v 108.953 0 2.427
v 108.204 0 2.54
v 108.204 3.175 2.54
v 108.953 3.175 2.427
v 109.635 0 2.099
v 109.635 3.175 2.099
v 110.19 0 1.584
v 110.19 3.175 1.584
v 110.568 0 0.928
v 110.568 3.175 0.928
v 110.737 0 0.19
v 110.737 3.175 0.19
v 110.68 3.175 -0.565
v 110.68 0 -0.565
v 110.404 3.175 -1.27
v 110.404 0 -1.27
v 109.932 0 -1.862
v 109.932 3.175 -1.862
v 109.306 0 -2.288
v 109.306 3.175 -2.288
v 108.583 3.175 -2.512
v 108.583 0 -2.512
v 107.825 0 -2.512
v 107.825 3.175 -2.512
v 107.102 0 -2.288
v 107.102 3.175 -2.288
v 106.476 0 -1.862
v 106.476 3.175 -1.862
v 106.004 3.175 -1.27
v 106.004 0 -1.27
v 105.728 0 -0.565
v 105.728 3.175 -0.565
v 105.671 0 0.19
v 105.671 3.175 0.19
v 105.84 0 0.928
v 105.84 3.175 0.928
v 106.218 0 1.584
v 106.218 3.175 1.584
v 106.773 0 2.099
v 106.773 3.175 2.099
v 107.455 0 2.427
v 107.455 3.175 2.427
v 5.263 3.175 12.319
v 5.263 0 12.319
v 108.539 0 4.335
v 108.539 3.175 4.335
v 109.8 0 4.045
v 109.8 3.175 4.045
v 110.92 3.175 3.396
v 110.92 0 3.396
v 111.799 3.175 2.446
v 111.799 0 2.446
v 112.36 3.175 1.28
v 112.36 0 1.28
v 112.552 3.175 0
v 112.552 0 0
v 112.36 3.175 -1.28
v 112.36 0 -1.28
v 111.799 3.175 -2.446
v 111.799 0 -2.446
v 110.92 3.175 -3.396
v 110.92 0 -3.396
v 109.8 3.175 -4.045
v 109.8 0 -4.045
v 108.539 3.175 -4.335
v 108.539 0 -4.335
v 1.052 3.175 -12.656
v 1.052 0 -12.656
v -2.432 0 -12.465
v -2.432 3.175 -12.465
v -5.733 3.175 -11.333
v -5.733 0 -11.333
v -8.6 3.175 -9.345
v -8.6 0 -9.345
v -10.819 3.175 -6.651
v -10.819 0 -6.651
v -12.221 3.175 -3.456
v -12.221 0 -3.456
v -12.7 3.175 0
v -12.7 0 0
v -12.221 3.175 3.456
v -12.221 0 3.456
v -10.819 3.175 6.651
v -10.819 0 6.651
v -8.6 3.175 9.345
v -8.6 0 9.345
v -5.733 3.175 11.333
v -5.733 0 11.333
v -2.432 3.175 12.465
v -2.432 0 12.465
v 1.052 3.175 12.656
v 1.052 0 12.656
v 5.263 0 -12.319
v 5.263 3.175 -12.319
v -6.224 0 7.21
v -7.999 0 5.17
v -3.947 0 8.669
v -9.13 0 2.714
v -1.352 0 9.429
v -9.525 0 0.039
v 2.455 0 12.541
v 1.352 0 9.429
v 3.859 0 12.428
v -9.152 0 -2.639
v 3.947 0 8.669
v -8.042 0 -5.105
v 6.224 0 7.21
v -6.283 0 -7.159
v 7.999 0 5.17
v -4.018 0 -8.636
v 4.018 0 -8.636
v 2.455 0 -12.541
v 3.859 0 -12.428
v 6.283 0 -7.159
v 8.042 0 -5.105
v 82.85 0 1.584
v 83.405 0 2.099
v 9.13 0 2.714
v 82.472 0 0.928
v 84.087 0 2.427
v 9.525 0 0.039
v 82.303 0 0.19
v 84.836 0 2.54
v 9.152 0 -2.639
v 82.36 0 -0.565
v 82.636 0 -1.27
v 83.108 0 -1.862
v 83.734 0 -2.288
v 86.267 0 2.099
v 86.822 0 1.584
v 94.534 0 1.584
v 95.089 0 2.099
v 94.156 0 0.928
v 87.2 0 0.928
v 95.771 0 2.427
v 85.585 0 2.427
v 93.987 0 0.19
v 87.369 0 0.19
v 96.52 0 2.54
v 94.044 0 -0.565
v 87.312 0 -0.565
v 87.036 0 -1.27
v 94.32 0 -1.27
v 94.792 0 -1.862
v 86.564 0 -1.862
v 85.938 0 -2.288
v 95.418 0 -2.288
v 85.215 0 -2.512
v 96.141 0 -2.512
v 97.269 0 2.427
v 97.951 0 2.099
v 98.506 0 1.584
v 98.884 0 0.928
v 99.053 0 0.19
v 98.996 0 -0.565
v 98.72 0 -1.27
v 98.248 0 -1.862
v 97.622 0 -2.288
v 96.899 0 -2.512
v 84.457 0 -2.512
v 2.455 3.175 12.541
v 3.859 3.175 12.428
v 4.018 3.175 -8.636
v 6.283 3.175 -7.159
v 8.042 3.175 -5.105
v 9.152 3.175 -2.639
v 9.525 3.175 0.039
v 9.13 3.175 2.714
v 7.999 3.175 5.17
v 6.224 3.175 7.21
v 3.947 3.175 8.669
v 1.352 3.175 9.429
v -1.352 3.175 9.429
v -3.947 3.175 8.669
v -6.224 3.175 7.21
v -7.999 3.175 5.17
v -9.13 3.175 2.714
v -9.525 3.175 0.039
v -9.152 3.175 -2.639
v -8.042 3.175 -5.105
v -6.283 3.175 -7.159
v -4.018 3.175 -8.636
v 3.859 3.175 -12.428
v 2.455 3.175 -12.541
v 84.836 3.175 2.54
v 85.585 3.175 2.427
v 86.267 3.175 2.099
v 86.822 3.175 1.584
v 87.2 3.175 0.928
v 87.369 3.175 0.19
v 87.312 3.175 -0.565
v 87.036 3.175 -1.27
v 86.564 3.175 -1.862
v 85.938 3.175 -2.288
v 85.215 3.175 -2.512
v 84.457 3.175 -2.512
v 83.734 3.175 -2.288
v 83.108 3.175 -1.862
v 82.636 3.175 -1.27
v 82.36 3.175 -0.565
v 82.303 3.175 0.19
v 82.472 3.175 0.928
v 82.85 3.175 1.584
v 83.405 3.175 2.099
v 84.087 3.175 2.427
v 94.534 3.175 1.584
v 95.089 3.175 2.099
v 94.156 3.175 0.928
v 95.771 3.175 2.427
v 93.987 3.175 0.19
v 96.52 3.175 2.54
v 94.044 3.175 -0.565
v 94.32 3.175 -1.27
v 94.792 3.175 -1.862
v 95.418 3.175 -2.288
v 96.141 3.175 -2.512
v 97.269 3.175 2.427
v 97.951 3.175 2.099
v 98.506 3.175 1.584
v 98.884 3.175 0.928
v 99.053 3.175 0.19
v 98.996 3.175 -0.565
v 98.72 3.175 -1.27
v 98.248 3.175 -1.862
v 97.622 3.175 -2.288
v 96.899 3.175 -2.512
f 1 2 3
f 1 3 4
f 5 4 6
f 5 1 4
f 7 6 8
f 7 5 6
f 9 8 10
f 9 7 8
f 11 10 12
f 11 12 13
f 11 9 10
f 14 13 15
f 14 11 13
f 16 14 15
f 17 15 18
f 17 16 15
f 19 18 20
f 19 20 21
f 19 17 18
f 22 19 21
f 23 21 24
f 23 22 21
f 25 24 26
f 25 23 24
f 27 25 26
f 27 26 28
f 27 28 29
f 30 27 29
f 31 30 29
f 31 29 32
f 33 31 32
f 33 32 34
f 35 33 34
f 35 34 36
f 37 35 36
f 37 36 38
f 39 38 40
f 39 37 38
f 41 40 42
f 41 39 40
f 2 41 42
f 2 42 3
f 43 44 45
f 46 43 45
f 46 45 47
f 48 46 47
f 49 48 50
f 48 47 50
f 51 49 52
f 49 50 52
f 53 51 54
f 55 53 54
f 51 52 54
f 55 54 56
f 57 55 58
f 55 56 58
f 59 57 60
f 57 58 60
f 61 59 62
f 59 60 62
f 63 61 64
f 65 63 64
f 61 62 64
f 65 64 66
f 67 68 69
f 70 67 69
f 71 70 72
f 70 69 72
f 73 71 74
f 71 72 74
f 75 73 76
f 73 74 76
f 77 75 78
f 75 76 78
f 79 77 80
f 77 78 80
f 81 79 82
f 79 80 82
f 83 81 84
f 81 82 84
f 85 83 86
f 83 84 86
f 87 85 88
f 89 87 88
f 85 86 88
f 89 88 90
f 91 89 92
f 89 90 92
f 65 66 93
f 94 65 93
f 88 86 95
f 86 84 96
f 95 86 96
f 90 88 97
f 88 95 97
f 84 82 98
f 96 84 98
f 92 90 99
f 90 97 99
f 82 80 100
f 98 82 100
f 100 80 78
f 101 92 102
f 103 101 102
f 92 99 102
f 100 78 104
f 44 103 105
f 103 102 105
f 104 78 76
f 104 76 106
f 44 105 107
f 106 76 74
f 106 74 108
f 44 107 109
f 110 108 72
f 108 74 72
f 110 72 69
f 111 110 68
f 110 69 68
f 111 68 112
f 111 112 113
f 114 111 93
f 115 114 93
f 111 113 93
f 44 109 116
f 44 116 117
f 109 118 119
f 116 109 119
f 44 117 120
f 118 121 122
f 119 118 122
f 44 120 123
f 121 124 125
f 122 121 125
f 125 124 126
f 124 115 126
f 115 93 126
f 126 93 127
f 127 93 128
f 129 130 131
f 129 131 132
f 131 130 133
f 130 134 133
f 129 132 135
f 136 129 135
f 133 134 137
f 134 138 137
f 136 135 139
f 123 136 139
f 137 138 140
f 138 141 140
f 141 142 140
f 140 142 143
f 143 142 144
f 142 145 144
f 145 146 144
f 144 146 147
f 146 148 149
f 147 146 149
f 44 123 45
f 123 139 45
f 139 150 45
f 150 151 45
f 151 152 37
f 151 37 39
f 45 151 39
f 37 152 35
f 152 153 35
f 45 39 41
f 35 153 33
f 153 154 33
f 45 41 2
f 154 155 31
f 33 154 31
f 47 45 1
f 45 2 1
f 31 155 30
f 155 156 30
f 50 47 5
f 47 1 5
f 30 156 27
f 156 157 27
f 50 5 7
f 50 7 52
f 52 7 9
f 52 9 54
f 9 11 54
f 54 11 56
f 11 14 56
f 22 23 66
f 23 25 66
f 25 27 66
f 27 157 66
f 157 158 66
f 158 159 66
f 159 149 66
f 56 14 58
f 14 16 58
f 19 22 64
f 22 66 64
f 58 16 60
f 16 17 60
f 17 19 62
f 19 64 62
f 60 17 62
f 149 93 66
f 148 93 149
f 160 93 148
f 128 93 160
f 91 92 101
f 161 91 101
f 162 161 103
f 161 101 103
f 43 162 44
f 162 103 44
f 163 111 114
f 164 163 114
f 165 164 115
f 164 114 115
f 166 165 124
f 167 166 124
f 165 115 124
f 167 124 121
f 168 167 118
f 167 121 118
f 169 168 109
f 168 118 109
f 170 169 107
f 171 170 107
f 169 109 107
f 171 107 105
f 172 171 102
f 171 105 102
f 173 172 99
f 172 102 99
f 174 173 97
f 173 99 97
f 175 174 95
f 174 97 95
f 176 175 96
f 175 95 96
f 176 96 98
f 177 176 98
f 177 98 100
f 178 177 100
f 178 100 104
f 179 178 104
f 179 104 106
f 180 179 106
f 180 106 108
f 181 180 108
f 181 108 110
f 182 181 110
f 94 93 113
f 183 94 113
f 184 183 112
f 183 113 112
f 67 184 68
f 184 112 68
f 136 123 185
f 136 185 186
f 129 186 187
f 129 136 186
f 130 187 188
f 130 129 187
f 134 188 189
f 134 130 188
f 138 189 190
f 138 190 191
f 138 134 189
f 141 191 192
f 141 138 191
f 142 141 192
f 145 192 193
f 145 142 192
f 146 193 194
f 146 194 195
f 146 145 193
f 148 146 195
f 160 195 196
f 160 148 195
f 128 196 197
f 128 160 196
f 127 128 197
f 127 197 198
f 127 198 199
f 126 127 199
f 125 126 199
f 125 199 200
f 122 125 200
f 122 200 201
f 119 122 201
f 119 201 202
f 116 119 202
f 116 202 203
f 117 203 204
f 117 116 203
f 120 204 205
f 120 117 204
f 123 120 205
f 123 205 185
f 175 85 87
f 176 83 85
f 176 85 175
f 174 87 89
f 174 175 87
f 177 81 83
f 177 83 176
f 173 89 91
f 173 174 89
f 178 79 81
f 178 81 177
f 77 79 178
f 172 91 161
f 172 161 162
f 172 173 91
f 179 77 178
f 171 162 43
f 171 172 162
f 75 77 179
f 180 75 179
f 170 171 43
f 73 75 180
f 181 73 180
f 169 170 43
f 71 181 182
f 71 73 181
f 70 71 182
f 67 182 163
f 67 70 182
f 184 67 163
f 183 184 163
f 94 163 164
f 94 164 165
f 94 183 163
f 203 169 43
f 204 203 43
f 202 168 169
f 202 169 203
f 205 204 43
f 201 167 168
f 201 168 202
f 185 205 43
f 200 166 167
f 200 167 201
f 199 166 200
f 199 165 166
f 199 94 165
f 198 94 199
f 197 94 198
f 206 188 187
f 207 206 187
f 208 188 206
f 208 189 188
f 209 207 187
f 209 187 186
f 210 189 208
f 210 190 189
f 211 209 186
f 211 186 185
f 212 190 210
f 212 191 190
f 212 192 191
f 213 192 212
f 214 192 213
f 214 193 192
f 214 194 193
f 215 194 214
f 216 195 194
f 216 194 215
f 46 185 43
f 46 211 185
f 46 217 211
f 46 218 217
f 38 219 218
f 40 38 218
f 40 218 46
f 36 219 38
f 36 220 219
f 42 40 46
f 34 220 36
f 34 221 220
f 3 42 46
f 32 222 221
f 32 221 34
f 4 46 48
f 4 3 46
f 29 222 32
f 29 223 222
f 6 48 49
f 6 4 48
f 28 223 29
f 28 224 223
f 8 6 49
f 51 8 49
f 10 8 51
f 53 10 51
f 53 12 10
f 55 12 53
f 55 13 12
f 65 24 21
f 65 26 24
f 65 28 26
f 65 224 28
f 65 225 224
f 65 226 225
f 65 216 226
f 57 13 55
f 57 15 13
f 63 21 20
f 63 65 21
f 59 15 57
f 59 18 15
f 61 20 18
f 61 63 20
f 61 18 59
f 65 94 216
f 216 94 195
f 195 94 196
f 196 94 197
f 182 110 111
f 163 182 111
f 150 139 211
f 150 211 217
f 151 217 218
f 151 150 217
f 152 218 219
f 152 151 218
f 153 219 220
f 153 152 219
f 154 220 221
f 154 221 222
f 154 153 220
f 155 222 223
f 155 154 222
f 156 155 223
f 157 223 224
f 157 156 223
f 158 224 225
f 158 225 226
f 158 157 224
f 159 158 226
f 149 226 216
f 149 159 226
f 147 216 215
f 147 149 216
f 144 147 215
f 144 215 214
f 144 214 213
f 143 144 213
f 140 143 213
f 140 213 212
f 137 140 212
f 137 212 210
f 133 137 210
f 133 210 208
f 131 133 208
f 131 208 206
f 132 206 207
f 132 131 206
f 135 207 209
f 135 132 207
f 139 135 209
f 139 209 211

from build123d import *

# Parameters (mm, degrees)
SKETCH1_R               = 2.54
BOSS_EXTRUDE1_DEPTH     = 3.175
CUT_EXTRUDE1_DEPTH      = 114.310823319
CUT_EXTRUDE1_DEPTH_BACK = 114.310823319


with BuildPart() as part:
    # Sketch1 → Boss-Extrude1 (new body)
    with BuildSketch(Plane(origin=(0, 0, 0), x_dir=(1, 0, 0), z_dir=(0, 1, 0))):
        with BuildLine():
            Line((108.539117009, 4.335152614), (5.263477484, 12.318590912))
            ThreePointArc((5.263477484, 12.318590912), (3.157372026, 12.484449553), (1.051753091, 12.656374498))
            ThreePointArc((1.051753091, 12.656374498), (-12.7, 0), (1.051753091, -12.656374498))
            ThreePointArc((1.051753091, -12.656374498), (3.157372026, -12.484449553), (5.263477484, -12.318590912))
            Line((5.263477484, -12.318590912), (108.539117009, -4.335152614))
            ThreePointArc((108.539117009, -4.335152614), (112.55208597, 0), (108.539117009, 4.335152614))
        make_face()
        with Locations(Location((108.204, 0, 0), (0, 0, 270))):
            Circle(SKETCH1_R, mode=Mode.SUBTRACT)
        with Locations(Location((96.52, 0, 0), (0, 0, 270))):
            Circle(SKETCH1_R, mode=Mode.SUBTRACT)
        with Locations(Location((84.836, 0, 0), (0, 0, 270))):
            Circle(SKETCH1_R, mode=Mode.SUBTRACT)
    extrude(amount=BOSS_EXTRUDE1_DEPTH)

    # Sketch3 → Cut-Extrude1 (cut, two sides: drawn at the far end of the back side and taken through both)
    with BuildSketch(Plane(origin=(0, 0, 0), x_dir=(1, 0, 0), z_dir=(0, 1, 0)).offset(-CUT_EXTRUDE1_DEPTH_BACK)):
        with BuildLine():
            Line((-4.018100173, 8.636), (4.018100173, 8.636))
            ThreePointArc((4.018100173, 8.636), (0, -9.525), (-4.018100173, 8.636))
        make_face()
    extrude(amount=CUT_EXTRUDE1_DEPTH + CUT_EXTRUDE1_DEPTH_BACK, mode=Mode.SUBTRACT)


solid = part.part
